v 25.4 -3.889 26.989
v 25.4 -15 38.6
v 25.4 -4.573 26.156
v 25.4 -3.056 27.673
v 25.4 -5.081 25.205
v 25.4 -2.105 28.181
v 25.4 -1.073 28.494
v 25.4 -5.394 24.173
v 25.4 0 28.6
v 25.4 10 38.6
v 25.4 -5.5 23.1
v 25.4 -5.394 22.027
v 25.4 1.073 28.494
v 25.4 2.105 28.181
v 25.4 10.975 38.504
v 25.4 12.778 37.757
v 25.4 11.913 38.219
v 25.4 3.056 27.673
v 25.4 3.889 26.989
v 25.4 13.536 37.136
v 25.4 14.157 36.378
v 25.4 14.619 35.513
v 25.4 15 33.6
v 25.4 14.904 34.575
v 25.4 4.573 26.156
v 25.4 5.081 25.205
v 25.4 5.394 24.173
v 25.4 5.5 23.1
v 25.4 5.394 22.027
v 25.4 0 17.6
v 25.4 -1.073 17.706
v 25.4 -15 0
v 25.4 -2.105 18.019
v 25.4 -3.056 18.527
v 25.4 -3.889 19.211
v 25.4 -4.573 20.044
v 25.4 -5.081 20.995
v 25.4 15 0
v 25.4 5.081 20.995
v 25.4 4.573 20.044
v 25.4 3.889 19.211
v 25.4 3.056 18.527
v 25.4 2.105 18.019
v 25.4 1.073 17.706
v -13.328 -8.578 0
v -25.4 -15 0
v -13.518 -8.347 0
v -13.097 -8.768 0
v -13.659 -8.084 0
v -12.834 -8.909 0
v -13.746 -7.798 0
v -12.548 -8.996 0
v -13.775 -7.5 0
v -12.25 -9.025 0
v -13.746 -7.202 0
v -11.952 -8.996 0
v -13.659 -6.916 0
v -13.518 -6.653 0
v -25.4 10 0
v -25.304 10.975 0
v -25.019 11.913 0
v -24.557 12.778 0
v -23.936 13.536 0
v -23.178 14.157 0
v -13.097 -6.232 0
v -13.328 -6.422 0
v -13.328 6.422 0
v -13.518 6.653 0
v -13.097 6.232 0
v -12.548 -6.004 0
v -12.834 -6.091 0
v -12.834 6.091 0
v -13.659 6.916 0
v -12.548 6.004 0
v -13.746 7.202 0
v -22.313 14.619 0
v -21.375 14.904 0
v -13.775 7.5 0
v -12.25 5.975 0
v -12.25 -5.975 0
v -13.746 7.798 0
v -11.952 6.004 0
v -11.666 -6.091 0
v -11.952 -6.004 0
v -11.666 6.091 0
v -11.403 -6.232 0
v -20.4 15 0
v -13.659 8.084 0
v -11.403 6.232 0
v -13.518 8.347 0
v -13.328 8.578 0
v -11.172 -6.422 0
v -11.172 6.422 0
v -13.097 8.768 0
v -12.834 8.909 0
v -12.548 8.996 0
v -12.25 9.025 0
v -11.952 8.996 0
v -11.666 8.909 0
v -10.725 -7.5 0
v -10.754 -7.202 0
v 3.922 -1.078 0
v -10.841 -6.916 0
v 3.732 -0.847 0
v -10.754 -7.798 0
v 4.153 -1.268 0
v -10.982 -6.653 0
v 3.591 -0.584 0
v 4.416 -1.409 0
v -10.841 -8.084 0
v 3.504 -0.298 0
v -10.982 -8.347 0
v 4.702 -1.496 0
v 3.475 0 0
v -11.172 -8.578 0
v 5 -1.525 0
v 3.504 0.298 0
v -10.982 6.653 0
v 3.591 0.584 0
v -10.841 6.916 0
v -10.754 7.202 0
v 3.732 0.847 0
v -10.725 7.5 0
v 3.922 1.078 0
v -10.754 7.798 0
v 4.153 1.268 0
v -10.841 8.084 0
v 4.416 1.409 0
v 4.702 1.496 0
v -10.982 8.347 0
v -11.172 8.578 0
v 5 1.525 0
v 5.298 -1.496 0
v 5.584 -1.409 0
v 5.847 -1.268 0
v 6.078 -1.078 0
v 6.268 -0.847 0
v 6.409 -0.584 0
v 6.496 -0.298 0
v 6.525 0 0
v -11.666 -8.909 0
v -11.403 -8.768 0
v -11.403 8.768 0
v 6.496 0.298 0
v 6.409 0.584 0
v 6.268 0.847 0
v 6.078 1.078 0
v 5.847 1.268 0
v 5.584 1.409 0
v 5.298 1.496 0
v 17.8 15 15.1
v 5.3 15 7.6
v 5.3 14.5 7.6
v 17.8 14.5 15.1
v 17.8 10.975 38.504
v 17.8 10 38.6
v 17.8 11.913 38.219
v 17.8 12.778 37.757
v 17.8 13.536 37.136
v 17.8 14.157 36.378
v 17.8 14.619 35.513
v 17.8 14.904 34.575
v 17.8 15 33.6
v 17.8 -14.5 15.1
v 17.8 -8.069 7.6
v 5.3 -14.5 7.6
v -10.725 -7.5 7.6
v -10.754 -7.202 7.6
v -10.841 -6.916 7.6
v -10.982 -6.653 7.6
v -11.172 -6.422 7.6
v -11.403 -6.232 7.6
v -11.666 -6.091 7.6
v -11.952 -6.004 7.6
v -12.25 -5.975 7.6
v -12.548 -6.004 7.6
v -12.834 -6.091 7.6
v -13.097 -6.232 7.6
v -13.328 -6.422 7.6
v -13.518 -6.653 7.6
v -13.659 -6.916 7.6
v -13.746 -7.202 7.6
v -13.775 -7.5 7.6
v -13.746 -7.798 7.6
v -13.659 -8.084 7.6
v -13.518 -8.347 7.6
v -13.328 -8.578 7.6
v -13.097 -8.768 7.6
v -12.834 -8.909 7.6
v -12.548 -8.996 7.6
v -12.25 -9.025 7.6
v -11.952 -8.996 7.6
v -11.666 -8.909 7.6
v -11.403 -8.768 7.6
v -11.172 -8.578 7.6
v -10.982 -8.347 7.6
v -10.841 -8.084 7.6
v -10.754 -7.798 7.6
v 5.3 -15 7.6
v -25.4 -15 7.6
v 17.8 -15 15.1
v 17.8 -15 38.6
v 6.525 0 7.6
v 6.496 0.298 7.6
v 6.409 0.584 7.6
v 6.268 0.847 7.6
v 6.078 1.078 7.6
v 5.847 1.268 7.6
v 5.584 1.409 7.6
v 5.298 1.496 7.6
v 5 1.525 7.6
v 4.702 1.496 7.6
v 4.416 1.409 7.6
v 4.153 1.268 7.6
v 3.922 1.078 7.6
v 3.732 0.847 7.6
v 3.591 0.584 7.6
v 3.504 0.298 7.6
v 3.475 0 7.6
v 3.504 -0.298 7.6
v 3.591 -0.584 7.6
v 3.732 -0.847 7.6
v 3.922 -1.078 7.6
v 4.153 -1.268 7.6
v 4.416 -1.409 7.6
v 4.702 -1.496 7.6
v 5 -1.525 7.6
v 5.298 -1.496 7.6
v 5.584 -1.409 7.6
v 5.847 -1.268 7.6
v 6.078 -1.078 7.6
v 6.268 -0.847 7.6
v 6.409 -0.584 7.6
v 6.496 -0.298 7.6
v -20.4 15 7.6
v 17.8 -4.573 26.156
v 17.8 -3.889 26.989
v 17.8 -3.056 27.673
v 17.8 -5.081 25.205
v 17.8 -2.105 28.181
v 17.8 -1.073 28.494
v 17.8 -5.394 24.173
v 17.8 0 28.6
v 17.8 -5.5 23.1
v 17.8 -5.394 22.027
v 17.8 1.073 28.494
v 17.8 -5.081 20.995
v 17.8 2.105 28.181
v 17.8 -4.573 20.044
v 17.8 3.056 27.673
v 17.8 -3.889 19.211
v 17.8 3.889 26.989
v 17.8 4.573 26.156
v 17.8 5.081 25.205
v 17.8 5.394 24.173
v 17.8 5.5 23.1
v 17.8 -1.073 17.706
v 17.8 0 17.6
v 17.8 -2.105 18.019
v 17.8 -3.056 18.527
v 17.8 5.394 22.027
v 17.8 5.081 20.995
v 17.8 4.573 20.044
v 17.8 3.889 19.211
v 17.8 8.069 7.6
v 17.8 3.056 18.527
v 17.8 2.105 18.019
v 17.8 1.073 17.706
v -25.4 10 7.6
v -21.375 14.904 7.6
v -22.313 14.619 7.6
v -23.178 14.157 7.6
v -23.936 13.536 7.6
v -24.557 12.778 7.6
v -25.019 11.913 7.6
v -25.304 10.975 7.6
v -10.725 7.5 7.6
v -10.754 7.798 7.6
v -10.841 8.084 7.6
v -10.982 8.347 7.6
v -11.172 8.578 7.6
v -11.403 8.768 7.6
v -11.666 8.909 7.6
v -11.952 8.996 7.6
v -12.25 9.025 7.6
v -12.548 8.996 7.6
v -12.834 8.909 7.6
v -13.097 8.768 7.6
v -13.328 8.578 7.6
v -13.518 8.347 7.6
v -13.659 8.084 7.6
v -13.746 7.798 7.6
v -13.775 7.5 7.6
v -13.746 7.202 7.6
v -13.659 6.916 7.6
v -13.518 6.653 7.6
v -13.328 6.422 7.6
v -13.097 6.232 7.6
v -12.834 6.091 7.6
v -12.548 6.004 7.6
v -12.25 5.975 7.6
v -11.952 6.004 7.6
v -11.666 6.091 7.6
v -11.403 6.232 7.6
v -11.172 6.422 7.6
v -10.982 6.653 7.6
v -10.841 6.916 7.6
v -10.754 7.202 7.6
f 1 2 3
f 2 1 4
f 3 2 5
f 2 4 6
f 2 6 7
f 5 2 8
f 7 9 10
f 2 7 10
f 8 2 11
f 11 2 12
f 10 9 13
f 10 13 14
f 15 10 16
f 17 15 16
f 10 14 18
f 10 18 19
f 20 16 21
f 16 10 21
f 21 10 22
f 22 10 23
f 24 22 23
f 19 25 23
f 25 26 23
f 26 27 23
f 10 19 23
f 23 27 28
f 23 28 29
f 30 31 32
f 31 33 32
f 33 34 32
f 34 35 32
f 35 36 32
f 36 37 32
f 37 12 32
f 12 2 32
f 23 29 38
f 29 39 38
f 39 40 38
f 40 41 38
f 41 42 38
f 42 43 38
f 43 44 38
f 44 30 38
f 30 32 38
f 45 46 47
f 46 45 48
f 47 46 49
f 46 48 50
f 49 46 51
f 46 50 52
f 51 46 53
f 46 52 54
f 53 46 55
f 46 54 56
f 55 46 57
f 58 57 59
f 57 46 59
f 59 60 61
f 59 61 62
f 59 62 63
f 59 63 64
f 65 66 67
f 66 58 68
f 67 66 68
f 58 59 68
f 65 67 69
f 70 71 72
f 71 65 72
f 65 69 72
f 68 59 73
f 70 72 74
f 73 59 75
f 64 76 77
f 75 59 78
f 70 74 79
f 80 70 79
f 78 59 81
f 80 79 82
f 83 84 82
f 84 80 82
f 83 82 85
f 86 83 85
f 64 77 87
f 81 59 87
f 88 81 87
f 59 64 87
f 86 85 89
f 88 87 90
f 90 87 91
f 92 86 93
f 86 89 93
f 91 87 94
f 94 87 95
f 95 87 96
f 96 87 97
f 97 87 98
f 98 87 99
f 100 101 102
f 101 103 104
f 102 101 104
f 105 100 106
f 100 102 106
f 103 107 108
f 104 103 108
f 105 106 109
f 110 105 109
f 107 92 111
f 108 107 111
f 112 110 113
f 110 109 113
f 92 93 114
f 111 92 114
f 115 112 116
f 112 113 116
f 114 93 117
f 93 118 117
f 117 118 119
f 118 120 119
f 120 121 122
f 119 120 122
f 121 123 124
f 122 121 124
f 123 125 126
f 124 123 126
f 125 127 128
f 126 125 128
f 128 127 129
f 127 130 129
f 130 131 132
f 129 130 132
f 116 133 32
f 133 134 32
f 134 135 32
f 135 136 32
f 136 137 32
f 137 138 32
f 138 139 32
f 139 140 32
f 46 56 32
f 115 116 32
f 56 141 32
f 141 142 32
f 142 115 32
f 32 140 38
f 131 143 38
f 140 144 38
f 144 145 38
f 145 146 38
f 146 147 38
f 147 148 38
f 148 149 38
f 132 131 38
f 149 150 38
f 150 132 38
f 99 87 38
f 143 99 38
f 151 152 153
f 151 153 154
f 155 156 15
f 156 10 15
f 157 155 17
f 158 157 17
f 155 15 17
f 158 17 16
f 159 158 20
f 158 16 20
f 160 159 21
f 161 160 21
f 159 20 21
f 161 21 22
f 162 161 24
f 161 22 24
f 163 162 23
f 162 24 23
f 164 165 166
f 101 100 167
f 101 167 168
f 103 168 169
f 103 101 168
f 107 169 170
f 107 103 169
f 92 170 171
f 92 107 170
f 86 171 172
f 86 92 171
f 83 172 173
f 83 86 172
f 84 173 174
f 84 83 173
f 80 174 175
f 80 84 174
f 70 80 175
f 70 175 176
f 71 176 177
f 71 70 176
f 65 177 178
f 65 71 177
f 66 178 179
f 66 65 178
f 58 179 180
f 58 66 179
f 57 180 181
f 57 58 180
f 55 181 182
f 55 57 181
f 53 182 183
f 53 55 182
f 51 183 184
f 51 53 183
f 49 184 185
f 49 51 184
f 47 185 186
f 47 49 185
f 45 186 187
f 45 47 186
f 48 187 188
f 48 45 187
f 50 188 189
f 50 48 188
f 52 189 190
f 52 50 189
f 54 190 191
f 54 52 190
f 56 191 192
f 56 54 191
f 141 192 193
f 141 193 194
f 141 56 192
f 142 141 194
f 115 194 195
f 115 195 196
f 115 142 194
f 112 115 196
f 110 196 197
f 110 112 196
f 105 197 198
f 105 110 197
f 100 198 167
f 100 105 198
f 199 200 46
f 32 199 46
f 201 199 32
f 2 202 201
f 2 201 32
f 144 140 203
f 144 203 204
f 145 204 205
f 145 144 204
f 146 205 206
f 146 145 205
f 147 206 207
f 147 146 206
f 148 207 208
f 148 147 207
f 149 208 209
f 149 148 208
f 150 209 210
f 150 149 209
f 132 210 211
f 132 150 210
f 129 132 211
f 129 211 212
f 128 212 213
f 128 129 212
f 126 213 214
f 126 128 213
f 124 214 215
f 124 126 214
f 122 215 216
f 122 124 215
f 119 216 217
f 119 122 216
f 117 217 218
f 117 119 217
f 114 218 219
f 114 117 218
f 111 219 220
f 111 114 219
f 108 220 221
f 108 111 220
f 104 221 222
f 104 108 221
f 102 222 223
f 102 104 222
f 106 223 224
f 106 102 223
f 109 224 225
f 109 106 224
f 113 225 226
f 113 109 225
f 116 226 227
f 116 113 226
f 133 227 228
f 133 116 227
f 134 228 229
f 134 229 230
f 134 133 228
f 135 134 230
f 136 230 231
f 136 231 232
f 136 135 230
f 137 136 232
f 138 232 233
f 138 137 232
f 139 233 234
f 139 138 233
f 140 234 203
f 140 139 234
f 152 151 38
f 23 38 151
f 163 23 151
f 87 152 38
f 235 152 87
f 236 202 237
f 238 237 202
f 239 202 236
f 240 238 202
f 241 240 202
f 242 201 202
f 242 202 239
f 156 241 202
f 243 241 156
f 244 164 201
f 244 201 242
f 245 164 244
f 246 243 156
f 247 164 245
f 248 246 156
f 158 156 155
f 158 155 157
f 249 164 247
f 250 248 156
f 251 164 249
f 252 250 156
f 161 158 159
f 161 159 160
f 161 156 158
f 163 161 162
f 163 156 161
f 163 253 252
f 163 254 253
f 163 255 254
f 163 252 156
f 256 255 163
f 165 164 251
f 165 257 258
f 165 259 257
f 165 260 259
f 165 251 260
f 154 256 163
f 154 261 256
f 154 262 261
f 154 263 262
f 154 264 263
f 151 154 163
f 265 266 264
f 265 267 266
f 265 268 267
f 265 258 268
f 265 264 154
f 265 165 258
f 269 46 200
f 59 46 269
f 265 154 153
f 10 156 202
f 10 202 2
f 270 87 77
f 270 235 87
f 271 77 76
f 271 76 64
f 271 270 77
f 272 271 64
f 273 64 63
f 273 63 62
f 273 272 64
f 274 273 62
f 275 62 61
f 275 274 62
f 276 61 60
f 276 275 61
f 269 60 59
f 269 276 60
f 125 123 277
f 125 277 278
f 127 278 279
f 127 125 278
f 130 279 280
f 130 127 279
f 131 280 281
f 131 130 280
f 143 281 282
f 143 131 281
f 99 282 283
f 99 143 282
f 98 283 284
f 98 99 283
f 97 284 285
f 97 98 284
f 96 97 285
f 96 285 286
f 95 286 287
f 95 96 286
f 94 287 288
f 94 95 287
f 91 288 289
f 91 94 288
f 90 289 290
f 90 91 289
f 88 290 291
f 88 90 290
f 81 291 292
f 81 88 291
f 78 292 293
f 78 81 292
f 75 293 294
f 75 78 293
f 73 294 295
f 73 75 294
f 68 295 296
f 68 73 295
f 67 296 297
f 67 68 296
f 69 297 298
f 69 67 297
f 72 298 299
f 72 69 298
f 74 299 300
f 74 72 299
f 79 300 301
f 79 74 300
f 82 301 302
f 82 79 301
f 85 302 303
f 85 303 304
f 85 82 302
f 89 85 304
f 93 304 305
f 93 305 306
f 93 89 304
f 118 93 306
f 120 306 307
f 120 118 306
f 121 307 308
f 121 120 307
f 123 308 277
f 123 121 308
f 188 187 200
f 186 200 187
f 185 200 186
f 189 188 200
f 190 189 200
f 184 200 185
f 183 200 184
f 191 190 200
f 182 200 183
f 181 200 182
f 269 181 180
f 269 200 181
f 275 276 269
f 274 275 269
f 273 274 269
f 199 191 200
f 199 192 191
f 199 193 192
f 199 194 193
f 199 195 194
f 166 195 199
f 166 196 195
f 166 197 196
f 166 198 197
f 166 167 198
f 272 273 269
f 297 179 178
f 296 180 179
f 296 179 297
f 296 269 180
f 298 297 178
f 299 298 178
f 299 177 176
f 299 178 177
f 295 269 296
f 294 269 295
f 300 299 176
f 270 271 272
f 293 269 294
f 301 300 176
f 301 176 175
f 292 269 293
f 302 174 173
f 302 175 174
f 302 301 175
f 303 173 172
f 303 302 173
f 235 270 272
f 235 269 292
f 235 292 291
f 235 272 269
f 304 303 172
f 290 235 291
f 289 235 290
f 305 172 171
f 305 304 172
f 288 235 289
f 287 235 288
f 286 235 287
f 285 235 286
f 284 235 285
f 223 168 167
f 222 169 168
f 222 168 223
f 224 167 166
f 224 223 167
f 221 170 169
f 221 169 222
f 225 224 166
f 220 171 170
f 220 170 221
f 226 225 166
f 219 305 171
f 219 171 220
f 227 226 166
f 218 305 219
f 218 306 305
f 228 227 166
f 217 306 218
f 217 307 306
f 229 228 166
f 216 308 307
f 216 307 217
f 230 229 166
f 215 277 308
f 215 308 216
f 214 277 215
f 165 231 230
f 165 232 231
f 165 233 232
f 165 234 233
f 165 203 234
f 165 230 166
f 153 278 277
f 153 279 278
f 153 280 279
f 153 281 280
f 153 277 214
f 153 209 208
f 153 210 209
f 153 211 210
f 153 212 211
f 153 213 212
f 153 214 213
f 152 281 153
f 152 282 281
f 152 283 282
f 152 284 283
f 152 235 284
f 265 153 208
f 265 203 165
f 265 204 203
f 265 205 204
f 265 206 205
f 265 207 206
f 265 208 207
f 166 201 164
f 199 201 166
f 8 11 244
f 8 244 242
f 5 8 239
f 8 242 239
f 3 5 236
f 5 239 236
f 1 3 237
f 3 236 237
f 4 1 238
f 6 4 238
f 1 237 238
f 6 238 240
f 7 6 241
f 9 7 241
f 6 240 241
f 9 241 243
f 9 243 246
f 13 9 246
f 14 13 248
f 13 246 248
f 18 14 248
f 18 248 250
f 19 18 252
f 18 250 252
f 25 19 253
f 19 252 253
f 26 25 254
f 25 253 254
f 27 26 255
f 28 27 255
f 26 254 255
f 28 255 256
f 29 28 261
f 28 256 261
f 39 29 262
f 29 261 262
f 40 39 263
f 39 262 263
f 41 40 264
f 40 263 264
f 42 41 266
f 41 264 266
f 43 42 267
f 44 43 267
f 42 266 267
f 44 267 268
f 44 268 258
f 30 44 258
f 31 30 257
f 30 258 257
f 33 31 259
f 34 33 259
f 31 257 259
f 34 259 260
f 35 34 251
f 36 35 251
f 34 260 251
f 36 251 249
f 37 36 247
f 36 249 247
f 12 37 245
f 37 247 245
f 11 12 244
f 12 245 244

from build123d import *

# Parameters (mm, degrees)
F0_W          = 50.8
F0_H          = 30
F0_R          = 1.525
F1_DEPTH      = 7.6
F2_W          = 7.6
F2_H          = 30
F3_DEPTH      = 31
F4_R          = 5.5
F5_DEPTH      = 7.6
F6_R          = 5
F9_DEPTH      = 7
F10_DEPTH     = 7
F11_T4_DEPTH  = 48.0092585807
F11_T10_DEPTH = 48.0092585807


# Not quite as in the source:
# - a fillet or chamfer that OpenCascade refuses, or shapes differently, is made with other operations: its cross-section is extruded or revolved along the edge and cut away or added


with BuildPart() as f1:
    # F0 (on Top) → F1 (new body)
    with BuildSketch(Plane.XY):
        Rectangle(F0_W, F0_H)
        with Locations((-12.25, -7.5)):
            Circle(F0_R, mode=Mode.SUBTRACT)
        with Locations((-12.25, 7.5)):
            Circle(F0_R, mode=Mode.SUBTRACT)
        with Locations((5, 0)):
            Circle(F0_R, mode=Mode.SUBTRACT)
    extrude(amount=F1_DEPTH)

    # F2 (on face) → F3 (join)
    with BuildSketch(Plane.XY.offset(7.6)):
        with Locations((21.6, 0)):
            Rectangle(F2_W, F2_H)
    extrude(amount=F3_DEPTH)

    # F4 (on face) → F5 (cut)
    with BuildSketch(Plane(origin=(17.8, 0, 0), x_dir=(0, -1, 0), z_dir=(-1, 0, 0))):
        with Locations((0, 23.1)):
            Circle(F4_R)
    extrude(amount=-F5_DEPTH, mode=Mode.SUBTRACT)

    # F6
    f6_edges = [f1.edges().sort_by_distance(p)[0] for p in [
        (21.6, 15, 38.6),
        (-25.4, 15, 3.8),
    ]]
    fillet(f6_edges, radius=F6_R)

    # F7 (on face) → F9 (join)
    with BuildSketch(Plane(origin=(0, 15, 0), x_dir=(-1, 0, 0), z_dir=(0, 1, 0))):
        Polygon((-5.3, 7.6), (-17.8, 15.1), (-17.8, 7.6), align=None)
    extrude(amount=-F9_DEPTH)

    # F8 (on face) → F10 (join)
    with BuildSketch(Plane.XZ.offset(15)):
        Polygon((17.8, 7.6), (17.8, 15.1), (5.3, 7.6), align=None)
    extrude(amount=-F10_DEPTH)

    # F11: chamfer of 6.5 on 2 edges, made by hand


with BuildPart() as f11_tool2:
    # F11_s3 → F11_t4 (new body)
    with BuildSketch(Plane(origin=(-7.0837998008, 0, -4.2502798805), x_dir=(0, 1, 0), z_dir=(0.8574929257, 0, 0.5144957554))):
        Polygon((14.5, 3.7901187316), (8, -2.7098812684), (8, 3.7901187316), align=None)
    extrude(amount=F11_T4_DEPTH)

    split(bisect_by=Plane.YZ.offset(17.8), keep=Keep.BOTTOM)

    split(bisect_by=Plane.XY.offset(7.6), keep=Keep.TOP)


with BuildPart() as f1_1:
    add(f1.part)

    # F11_t1: cut F11_tool2
    add(f11_tool2.part, mode=Mode.SUBTRACT)


with BuildPart() as f11_tool8:
    # F11_s9 → F11_t10 (new body)
    with BuildSketch(Plane(origin=(34.0837998008, 0, 20.4502798805), x_dir=(0, 1, 0), z_dir=(-0.8574929257, 0, -0.5144957554))):
        Polygon((-8, 2.7098812684), (-14.5, -3.7901187316), (-8, -3.7901187316), align=None)
    extrude(amount=F11_T10_DEPTH)

    split(bisect_by=Plane.YZ.offset(17.8), keep=Keep.BOTTOM)

    split(bisect_by=Plane.XY.offset(7.6), keep=Keep.TOP)


with BuildPart() as f1_2:
    add(f1_1.part)

    # F11_t7: cut F11_tool8
    add(f11_tool8.part, mode=Mode.SUBTRACT)


solid = f1_2.part
